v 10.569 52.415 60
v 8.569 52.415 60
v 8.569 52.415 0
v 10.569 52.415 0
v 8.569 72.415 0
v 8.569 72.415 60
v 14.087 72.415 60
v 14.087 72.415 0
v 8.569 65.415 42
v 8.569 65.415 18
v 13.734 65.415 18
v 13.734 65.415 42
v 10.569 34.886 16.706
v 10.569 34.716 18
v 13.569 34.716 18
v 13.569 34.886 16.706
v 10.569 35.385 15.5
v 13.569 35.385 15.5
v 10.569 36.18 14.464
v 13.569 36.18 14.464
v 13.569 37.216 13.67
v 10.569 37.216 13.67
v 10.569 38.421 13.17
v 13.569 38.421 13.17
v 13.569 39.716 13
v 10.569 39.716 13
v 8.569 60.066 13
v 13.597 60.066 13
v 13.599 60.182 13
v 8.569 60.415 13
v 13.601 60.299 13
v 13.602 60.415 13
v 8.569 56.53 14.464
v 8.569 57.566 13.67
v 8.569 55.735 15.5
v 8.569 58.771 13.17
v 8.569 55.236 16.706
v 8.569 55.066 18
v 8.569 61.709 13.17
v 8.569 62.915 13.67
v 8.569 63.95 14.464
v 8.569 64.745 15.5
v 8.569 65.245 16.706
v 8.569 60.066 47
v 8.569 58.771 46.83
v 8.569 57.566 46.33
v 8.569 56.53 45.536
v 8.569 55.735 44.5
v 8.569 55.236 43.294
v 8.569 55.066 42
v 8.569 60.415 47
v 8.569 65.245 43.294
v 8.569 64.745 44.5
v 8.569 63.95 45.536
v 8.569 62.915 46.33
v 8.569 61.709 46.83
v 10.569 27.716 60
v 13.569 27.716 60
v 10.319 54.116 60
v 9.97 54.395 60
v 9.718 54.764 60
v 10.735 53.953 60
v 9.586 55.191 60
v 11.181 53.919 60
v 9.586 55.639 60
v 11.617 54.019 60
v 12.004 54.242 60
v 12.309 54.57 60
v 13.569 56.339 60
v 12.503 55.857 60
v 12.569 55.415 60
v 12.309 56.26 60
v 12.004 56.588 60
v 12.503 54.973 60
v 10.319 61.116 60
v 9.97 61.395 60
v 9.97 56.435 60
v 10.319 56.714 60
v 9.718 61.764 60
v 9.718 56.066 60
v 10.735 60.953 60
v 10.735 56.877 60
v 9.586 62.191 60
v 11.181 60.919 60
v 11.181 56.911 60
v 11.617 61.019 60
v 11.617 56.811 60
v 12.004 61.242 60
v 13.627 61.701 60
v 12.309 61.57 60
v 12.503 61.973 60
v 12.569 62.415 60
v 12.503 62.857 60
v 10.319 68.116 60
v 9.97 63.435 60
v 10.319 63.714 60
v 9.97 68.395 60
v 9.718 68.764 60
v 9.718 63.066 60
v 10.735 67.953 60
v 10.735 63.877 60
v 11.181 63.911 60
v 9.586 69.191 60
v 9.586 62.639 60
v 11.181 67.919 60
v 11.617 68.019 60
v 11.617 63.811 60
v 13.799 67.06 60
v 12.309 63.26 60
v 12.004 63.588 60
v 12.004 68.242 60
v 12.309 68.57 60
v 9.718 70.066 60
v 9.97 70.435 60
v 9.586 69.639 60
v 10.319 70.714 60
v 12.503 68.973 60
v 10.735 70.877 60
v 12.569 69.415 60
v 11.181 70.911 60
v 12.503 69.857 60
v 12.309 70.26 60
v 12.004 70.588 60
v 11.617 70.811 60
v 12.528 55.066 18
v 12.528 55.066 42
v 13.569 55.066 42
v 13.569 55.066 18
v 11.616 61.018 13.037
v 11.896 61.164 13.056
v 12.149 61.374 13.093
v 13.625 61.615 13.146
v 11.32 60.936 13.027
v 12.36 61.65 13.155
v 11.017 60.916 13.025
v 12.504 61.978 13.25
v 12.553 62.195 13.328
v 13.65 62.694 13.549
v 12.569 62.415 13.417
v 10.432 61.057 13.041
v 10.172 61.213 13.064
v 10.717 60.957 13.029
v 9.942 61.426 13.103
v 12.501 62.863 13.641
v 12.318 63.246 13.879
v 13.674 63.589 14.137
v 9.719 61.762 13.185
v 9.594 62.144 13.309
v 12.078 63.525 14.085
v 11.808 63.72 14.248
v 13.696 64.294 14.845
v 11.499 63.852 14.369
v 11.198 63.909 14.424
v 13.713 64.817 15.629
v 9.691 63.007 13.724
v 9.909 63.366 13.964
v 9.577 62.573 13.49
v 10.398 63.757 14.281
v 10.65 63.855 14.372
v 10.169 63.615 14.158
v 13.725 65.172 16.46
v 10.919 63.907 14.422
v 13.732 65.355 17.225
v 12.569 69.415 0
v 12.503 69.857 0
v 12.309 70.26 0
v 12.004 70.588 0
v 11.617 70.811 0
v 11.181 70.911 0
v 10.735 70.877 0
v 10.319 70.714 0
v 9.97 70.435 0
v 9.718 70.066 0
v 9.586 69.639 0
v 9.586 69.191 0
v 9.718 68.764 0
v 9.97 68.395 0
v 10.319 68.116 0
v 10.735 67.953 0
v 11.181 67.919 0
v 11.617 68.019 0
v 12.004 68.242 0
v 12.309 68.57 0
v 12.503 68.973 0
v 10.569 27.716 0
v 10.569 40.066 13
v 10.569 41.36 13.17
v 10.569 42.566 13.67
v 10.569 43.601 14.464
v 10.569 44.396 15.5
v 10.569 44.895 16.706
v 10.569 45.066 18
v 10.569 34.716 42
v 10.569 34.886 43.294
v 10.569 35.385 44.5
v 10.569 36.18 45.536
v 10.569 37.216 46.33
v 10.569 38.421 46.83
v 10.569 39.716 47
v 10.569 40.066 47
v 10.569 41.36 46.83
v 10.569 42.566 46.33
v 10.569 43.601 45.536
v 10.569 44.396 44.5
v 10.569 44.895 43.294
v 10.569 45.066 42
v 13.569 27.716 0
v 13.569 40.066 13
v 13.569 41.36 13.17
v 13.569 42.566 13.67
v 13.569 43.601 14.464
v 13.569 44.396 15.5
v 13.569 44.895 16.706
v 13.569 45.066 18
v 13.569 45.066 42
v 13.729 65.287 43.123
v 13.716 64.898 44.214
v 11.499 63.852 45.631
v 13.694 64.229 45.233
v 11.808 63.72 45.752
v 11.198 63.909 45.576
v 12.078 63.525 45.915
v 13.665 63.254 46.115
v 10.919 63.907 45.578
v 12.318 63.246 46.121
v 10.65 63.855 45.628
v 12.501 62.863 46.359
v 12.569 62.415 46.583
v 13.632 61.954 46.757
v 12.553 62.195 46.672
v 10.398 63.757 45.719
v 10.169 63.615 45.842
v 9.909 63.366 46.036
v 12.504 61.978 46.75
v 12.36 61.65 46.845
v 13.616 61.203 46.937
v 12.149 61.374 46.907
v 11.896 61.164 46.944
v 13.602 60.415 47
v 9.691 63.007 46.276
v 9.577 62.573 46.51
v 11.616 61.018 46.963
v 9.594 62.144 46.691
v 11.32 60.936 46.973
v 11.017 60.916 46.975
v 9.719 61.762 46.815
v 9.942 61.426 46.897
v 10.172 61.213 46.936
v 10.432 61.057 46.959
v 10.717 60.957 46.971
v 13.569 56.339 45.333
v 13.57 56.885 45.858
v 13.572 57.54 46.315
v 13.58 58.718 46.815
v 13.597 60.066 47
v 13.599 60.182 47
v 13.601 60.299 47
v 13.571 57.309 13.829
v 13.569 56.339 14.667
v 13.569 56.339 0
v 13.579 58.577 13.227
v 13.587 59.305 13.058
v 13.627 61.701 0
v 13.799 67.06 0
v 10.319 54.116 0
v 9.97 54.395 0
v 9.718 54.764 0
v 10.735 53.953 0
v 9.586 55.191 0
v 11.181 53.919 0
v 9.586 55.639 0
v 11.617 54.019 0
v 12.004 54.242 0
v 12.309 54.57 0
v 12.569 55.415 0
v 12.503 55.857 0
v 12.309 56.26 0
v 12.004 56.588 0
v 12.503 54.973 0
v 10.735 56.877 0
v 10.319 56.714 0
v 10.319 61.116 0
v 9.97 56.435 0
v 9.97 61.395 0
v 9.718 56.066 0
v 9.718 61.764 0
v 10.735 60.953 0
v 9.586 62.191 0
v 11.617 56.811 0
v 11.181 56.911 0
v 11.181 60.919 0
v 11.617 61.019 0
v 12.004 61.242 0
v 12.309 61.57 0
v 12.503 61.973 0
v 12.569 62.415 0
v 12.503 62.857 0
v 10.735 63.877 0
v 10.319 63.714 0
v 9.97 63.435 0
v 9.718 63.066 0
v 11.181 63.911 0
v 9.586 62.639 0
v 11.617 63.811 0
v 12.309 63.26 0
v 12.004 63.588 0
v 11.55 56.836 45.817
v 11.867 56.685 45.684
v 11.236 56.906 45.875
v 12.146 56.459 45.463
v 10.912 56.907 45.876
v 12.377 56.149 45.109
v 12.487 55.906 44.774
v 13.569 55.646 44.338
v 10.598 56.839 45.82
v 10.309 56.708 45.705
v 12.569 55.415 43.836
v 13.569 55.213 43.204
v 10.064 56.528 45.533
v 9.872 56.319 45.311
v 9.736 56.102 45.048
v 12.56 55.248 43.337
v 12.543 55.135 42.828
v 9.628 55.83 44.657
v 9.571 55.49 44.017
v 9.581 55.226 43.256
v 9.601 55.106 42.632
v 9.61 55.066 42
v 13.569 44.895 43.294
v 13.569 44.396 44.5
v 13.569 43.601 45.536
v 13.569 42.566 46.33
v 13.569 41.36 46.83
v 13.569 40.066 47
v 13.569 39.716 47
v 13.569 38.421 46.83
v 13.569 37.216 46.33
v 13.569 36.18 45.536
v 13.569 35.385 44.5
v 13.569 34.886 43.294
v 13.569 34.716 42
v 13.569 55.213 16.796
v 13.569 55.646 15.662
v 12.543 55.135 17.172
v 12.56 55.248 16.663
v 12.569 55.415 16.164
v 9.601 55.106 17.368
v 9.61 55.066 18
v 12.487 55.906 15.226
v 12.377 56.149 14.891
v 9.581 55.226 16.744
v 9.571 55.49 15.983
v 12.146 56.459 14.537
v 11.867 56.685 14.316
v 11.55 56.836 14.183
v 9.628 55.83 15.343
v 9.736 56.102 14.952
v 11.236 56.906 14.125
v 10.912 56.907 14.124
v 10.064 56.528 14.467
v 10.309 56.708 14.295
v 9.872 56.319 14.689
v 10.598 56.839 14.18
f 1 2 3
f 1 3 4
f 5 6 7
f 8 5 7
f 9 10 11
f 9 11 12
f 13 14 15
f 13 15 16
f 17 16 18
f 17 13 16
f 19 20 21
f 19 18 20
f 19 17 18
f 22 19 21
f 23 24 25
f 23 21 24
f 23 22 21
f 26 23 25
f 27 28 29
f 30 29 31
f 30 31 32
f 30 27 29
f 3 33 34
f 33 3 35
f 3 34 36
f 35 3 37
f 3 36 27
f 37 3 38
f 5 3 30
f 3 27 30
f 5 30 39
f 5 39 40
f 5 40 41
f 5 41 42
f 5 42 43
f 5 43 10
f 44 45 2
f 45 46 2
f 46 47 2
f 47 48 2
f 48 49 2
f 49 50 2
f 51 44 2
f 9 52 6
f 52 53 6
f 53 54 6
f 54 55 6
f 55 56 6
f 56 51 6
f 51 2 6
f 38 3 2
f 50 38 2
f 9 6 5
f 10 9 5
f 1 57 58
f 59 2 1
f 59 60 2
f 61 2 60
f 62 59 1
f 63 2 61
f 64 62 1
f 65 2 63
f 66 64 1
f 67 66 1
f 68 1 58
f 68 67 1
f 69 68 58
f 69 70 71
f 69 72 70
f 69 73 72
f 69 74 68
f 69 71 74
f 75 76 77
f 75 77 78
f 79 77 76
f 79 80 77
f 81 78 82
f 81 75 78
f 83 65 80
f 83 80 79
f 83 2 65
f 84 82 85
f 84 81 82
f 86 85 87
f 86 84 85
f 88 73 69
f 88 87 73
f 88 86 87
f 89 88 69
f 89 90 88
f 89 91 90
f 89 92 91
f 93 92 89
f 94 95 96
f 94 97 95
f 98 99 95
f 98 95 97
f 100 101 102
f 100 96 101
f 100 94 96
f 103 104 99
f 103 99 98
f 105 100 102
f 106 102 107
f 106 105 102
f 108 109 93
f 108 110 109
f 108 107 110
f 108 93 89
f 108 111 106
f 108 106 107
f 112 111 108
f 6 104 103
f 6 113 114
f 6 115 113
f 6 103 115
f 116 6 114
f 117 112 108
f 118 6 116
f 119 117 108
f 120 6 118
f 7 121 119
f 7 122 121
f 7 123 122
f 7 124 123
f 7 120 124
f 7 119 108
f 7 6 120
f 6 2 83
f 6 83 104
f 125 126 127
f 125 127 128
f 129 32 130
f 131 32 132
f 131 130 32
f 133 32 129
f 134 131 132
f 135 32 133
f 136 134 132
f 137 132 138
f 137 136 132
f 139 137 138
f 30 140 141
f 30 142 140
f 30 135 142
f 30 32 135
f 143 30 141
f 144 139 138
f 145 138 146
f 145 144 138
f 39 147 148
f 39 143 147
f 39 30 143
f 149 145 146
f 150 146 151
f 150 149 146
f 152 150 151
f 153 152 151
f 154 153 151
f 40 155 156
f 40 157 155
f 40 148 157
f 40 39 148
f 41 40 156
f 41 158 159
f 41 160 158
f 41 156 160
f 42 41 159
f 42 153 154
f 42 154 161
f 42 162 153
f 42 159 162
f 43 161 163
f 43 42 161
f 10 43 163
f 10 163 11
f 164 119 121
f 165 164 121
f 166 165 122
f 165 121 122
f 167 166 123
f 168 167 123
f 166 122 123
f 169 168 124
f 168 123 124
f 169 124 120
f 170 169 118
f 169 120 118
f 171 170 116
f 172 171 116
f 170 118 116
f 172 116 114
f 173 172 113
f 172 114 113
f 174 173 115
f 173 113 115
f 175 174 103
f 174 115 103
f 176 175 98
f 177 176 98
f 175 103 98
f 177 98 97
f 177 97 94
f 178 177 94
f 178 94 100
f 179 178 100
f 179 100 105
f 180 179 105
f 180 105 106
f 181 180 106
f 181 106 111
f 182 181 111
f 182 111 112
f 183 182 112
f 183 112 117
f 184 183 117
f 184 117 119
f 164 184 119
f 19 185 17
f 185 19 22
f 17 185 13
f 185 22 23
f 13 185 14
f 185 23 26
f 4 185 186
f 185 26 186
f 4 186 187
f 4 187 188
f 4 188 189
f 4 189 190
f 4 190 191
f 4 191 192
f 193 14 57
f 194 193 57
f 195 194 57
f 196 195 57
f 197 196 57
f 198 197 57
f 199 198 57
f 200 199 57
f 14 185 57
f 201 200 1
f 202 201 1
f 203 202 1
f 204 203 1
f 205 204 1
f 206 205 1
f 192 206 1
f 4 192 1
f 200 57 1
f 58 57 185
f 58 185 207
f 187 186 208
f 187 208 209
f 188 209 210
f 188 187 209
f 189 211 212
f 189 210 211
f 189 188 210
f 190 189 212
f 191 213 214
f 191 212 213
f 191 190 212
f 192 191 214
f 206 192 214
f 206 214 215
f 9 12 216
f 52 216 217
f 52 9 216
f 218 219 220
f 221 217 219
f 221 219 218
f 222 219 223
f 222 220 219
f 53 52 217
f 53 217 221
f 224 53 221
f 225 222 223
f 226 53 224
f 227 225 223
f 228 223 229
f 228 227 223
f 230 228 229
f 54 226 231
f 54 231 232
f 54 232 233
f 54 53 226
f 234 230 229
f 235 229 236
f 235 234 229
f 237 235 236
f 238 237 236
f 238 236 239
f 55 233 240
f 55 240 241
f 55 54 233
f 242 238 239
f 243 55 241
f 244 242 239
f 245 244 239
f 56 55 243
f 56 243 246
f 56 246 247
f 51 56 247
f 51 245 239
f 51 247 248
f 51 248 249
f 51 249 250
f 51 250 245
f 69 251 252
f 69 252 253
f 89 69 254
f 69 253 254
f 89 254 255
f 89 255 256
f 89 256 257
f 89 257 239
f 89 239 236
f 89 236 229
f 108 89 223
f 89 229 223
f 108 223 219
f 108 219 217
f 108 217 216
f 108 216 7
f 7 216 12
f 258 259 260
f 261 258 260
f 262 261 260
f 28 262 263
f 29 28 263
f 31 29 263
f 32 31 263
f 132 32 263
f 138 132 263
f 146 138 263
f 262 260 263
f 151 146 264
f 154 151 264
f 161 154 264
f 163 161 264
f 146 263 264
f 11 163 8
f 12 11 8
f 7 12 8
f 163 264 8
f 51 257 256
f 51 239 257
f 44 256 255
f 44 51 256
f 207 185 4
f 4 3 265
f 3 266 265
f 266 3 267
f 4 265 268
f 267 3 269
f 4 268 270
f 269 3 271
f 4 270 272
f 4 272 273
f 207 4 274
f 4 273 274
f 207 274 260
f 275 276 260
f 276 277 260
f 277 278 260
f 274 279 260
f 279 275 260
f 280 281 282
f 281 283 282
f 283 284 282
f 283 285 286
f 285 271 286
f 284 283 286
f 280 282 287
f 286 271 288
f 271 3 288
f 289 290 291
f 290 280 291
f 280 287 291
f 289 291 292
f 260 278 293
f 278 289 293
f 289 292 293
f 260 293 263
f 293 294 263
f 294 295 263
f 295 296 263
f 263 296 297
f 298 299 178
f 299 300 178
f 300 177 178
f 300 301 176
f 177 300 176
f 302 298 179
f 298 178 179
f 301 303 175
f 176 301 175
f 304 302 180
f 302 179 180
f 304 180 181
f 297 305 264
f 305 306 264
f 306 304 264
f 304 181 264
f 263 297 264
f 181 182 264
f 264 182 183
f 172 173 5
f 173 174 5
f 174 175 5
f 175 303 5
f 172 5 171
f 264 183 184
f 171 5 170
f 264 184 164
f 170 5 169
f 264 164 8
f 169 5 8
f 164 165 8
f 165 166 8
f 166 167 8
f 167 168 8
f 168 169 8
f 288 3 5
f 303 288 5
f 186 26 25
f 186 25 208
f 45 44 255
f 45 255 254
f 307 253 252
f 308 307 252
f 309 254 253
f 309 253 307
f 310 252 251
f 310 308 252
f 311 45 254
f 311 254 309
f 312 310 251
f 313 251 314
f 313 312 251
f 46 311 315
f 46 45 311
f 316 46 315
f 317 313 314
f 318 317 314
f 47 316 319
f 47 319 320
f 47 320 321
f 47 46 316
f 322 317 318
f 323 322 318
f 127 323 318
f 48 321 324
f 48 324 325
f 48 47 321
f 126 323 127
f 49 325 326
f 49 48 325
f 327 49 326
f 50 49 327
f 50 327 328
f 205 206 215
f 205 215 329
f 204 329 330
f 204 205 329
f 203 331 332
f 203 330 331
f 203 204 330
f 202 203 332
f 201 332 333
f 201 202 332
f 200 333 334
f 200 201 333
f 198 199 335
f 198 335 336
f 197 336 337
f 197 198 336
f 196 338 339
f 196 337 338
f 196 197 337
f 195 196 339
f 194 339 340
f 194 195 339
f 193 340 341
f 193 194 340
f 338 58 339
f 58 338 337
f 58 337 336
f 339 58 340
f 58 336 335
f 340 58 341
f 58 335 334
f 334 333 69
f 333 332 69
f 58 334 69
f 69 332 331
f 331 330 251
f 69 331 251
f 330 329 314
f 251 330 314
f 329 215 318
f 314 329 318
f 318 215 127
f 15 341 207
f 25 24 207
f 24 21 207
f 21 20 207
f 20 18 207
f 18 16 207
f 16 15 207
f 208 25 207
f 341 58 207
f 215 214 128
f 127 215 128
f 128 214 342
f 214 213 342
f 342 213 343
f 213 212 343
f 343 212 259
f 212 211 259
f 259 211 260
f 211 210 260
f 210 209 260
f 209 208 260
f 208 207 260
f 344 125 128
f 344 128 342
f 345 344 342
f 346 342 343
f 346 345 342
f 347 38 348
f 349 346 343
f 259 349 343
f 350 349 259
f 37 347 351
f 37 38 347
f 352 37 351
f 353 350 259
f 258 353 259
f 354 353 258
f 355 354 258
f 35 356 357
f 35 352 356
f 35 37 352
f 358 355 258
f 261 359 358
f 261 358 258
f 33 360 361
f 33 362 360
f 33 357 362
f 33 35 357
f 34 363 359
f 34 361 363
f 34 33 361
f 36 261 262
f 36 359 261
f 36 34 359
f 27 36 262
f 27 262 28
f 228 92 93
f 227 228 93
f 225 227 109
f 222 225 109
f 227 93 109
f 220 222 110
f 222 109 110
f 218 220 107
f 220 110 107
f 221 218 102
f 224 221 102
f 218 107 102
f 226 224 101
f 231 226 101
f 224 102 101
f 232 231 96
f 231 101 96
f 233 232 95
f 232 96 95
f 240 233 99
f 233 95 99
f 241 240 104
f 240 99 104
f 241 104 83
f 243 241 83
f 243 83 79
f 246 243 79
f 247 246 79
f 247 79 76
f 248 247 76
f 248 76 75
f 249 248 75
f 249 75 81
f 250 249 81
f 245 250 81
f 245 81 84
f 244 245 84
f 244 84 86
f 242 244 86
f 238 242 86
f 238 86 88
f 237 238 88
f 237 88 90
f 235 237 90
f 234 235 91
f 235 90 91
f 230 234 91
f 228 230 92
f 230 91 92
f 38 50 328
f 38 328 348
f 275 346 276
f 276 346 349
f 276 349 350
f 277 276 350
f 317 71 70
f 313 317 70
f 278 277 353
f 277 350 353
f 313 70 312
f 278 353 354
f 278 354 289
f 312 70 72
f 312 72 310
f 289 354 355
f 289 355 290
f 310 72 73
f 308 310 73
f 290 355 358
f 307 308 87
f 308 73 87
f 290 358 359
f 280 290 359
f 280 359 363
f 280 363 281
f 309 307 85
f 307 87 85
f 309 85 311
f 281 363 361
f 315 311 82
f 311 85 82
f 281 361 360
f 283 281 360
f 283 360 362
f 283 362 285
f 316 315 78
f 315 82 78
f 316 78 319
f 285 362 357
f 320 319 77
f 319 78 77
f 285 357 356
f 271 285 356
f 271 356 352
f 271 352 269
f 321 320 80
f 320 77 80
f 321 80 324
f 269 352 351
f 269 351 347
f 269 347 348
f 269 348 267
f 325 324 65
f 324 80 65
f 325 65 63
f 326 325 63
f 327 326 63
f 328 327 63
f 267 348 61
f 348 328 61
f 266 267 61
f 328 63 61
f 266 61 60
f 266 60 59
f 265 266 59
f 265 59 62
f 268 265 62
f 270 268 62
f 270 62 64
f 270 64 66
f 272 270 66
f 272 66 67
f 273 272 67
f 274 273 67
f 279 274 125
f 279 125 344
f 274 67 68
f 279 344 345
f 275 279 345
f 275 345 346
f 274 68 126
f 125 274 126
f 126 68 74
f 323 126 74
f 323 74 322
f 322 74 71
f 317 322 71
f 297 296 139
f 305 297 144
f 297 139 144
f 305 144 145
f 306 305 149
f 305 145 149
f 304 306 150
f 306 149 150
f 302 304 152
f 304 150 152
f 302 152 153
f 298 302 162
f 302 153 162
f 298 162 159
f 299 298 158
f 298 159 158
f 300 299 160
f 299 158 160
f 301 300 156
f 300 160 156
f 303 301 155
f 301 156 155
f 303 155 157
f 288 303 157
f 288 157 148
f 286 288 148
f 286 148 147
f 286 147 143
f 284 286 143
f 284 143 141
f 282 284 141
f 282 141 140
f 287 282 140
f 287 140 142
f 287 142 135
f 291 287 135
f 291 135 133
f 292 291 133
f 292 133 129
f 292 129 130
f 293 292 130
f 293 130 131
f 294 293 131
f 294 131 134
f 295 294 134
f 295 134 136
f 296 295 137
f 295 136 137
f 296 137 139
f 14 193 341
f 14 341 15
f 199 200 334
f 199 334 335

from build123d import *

# Parameters (mm, degrees)
RESSALTO_EXTRUS_O1_DEPTH = 60
ESBO_O7_R                = 2.076684074
CORTE_EXTRUS_O5_DEPTH    = 61
ESBO_O8_W                = 84.528747457
ESBO_O8_H                = 37.806532702
CORTE_EXTRUS_O6_DEPTH    = 61
ESBO_O9_W                = 39.370764713
ESBO_O9_H                = 9.06161947
CORTE_EXTRUS_O7_DEPTH    = 61
ESBO_O10_W               = 32.42010131
ESBO_O10_H               = 62.029224545
CORTE_EXTRUS_O8_DEPTH    = 61
ESBO_O12_W               = 17.69499929
ESBO_O12_H               = 9
CORTE_EXTRUS_O10_DEPTH   = 61
ESBO_O13_W               = 2
ESBO_O13_H               = 24.699383264
CORTE_EXTRUS_O11_DEPTH   = 61
CORTE_EXTRUS_O12_DEPTH   = 6.517415369
ESBO_O15_R               = 1.5
CORTE_EXTRUS_O13_DEPTH   = 61.0000001


with BuildPart() as part:
    # Esboço1 → Ressalto-extrusão1 (new body)
    with BuildSketch(Plane.XY):
        with BuildLine():
            Line((13.569146061, 27.715579822), (13.569146061, 56.338894978))
            ThreePointArc((13.569146061, 56.338894978), (13.884544414, 68.892766914), (14.829943665, 81.414963086))
            ThreePointArc((14.829943665, 81.414963086), (11.193742071, 116.066691762), (-16.576524471, 95.024435265))
            Line((-16.576524471, 95.024435265), (-16.487894969, 94.437265709))
            Line((-16.487894969, 94.437265709), (-16.369382775, 93.652123615))
            ThreePointArc((-16.369382775, 93.652123615), (-14.270188159, 75.047972701), (-13.569146061, 56.338894978))
            Line((-13.569146061, 56.338894978), (-13.569146061, 27.715579822))
            ThreePointArc((-13.569146061, 27.715579822), (0, 21.02683783), (13.569146061, 27.715579822))
        make_face()
    extrude(amount=RESSALTO_EXTRUS_O1_DEPTH)

    # Esboço7 → Corte-extrusão5 (cut, through all)
    with BuildSketch(Plane(origin=(0, 0, 0), x_dir=(-1, 0, 0), z_dir=(0, 0, -1))):
        with Locations((-0.267564972, 95.19)):
            Circle(ESBO_O7_R)
    extrude(amount=-CORTE_EXTRUS_O5_DEPTH, mode=Mode.SUBTRACT)

    # Esboço8 → Corte-extrusão6 (cut, through all)
    with BuildSketch(Plane.XY.offset(60)):
        with Locations((-3.694100087, 100.318229437)):
            Rectangle(ESBO_O8_W, ESBO_O8_H)
    extrude(amount=-CORTE_EXTRUS_O6_DEPTH, mode=Mode.SUBTRACT)

    # Esboço9 → Corte-extrusão7 (cut, through all)
    with BuildSketch(Plane.XY.offset(60)):
        with Locations((-6.116236296, 23.184770087)):
            Rectangle(ESBO_O9_W, ESBO_O9_H)
    extrude(amount=-CORTE_EXTRUS_O7_DEPTH, mode=Mode.SUBTRACT)

    # Esboço10 → Corte-extrusão8 (cut, through all)
    with BuildSketch(Plane.XY.offset(60)):
        with Locations((-7.640904594, 58.730192094)):
            Rectangle(ESBO_O10_W, ESBO_O10_H)
    extrude(amount=-CORTE_EXTRUS_O8_DEPTH, mode=Mode.SUBTRACT)

    # Esboço12 → Corte-extrusão10 (cut, through all)
    with BuildSketch(Plane.XY.offset(60)):
        with Locations((10.676364632, 76.914963086)):
            Rectangle(ESBO_O12_W, ESBO_O12_H)
    extrude(amount=-CORTE_EXTRUS_O10_DEPTH, mode=Mode.SUBTRACT)

    # Esboço13 → Corte-extrusão11 (cut, through all)
    with BuildSketch(Plane.XY.offset(60)):
        with Locations((9.569146061, 40.065271454)):
            Rectangle(ESBO_O13_W, ESBO_O13_H)
    extrude(amount=-CORTE_EXTRUS_O11_DEPTH, mode=Mode.SUBTRACT)

    # Esboço14 → Corte-extrusão12 (cut, through all)
    with BuildSketch(Plane.ZY.offset(-8.569146061)):
        with BuildLine():
            Line((42, 55.065579822), (18, 55.065579822))
            ThreePointArc((18, 55.065579822), (14.464466094, 56.530045916), (13, 60.065579822))
            Line((13, 60.065579822), (13, 60.414963086))
            ThreePointArc((13, 60.414963086), (14.464466094, 63.950496992), (18, 65.414963086))
            Line((18, 65.414963086), (42, 65.414963086))
            ThreePointArc((42, 65.414963086), (45.535533906, 63.950496992), (47, 60.414963086))
            Line((47, 60.414963086), (47, 60.065579822))
            ThreePointArc((47, 60.065579822), (45.535533906, 56.530045916), (42, 55.065579822))
        make_face()
        with BuildLine():
            Line((42, 34.715579822), (18, 34.715579822))
            ThreePointArc((18, 34.715579822), (14.464466094, 36.180045916), (13, 39.715579822))
            Line((13, 39.715579822), (13, 40.065579822))
            ThreePointArc((13, 40.065579822), (14.464466094, 43.601113728), (18, 45.065579822))
            Line((18, 45.065579822), (42, 45.065579822))
            ThreePointArc((42, 45.065579822), (45.535533906, 43.601113728), (47, 40.065579822))
            Line((47, 40.065579822), (47, 39.715579822))
            ThreePointArc((47, 39.715579822), (45.535533906, 36.180045916), (42, 34.715579822))
        make_face()
    extrude(amount=-CORTE_EXTRUS_O12_DEPTH, mode=Mode.SUBTRACT)

    # Esboço15 → Corte-extrusão13 (cut, through all)
    with BuildSketch(Plane.XY.offset(60)):
        with Locations((11.069146061, 69.414963086)):
            Circle(ESBO_O15_R)
        with Locations((11.069146061, 62.414963086)):
            Circle(ESBO_O15_R)
        with Locations((11.069146061, 55.414963086)):
            Circle(ESBO_O15_R)
    extrude(amount=-CORTE_EXTRUS_O13_DEPTH, mode=Mode.SUBTRACT)


solid = part.part
